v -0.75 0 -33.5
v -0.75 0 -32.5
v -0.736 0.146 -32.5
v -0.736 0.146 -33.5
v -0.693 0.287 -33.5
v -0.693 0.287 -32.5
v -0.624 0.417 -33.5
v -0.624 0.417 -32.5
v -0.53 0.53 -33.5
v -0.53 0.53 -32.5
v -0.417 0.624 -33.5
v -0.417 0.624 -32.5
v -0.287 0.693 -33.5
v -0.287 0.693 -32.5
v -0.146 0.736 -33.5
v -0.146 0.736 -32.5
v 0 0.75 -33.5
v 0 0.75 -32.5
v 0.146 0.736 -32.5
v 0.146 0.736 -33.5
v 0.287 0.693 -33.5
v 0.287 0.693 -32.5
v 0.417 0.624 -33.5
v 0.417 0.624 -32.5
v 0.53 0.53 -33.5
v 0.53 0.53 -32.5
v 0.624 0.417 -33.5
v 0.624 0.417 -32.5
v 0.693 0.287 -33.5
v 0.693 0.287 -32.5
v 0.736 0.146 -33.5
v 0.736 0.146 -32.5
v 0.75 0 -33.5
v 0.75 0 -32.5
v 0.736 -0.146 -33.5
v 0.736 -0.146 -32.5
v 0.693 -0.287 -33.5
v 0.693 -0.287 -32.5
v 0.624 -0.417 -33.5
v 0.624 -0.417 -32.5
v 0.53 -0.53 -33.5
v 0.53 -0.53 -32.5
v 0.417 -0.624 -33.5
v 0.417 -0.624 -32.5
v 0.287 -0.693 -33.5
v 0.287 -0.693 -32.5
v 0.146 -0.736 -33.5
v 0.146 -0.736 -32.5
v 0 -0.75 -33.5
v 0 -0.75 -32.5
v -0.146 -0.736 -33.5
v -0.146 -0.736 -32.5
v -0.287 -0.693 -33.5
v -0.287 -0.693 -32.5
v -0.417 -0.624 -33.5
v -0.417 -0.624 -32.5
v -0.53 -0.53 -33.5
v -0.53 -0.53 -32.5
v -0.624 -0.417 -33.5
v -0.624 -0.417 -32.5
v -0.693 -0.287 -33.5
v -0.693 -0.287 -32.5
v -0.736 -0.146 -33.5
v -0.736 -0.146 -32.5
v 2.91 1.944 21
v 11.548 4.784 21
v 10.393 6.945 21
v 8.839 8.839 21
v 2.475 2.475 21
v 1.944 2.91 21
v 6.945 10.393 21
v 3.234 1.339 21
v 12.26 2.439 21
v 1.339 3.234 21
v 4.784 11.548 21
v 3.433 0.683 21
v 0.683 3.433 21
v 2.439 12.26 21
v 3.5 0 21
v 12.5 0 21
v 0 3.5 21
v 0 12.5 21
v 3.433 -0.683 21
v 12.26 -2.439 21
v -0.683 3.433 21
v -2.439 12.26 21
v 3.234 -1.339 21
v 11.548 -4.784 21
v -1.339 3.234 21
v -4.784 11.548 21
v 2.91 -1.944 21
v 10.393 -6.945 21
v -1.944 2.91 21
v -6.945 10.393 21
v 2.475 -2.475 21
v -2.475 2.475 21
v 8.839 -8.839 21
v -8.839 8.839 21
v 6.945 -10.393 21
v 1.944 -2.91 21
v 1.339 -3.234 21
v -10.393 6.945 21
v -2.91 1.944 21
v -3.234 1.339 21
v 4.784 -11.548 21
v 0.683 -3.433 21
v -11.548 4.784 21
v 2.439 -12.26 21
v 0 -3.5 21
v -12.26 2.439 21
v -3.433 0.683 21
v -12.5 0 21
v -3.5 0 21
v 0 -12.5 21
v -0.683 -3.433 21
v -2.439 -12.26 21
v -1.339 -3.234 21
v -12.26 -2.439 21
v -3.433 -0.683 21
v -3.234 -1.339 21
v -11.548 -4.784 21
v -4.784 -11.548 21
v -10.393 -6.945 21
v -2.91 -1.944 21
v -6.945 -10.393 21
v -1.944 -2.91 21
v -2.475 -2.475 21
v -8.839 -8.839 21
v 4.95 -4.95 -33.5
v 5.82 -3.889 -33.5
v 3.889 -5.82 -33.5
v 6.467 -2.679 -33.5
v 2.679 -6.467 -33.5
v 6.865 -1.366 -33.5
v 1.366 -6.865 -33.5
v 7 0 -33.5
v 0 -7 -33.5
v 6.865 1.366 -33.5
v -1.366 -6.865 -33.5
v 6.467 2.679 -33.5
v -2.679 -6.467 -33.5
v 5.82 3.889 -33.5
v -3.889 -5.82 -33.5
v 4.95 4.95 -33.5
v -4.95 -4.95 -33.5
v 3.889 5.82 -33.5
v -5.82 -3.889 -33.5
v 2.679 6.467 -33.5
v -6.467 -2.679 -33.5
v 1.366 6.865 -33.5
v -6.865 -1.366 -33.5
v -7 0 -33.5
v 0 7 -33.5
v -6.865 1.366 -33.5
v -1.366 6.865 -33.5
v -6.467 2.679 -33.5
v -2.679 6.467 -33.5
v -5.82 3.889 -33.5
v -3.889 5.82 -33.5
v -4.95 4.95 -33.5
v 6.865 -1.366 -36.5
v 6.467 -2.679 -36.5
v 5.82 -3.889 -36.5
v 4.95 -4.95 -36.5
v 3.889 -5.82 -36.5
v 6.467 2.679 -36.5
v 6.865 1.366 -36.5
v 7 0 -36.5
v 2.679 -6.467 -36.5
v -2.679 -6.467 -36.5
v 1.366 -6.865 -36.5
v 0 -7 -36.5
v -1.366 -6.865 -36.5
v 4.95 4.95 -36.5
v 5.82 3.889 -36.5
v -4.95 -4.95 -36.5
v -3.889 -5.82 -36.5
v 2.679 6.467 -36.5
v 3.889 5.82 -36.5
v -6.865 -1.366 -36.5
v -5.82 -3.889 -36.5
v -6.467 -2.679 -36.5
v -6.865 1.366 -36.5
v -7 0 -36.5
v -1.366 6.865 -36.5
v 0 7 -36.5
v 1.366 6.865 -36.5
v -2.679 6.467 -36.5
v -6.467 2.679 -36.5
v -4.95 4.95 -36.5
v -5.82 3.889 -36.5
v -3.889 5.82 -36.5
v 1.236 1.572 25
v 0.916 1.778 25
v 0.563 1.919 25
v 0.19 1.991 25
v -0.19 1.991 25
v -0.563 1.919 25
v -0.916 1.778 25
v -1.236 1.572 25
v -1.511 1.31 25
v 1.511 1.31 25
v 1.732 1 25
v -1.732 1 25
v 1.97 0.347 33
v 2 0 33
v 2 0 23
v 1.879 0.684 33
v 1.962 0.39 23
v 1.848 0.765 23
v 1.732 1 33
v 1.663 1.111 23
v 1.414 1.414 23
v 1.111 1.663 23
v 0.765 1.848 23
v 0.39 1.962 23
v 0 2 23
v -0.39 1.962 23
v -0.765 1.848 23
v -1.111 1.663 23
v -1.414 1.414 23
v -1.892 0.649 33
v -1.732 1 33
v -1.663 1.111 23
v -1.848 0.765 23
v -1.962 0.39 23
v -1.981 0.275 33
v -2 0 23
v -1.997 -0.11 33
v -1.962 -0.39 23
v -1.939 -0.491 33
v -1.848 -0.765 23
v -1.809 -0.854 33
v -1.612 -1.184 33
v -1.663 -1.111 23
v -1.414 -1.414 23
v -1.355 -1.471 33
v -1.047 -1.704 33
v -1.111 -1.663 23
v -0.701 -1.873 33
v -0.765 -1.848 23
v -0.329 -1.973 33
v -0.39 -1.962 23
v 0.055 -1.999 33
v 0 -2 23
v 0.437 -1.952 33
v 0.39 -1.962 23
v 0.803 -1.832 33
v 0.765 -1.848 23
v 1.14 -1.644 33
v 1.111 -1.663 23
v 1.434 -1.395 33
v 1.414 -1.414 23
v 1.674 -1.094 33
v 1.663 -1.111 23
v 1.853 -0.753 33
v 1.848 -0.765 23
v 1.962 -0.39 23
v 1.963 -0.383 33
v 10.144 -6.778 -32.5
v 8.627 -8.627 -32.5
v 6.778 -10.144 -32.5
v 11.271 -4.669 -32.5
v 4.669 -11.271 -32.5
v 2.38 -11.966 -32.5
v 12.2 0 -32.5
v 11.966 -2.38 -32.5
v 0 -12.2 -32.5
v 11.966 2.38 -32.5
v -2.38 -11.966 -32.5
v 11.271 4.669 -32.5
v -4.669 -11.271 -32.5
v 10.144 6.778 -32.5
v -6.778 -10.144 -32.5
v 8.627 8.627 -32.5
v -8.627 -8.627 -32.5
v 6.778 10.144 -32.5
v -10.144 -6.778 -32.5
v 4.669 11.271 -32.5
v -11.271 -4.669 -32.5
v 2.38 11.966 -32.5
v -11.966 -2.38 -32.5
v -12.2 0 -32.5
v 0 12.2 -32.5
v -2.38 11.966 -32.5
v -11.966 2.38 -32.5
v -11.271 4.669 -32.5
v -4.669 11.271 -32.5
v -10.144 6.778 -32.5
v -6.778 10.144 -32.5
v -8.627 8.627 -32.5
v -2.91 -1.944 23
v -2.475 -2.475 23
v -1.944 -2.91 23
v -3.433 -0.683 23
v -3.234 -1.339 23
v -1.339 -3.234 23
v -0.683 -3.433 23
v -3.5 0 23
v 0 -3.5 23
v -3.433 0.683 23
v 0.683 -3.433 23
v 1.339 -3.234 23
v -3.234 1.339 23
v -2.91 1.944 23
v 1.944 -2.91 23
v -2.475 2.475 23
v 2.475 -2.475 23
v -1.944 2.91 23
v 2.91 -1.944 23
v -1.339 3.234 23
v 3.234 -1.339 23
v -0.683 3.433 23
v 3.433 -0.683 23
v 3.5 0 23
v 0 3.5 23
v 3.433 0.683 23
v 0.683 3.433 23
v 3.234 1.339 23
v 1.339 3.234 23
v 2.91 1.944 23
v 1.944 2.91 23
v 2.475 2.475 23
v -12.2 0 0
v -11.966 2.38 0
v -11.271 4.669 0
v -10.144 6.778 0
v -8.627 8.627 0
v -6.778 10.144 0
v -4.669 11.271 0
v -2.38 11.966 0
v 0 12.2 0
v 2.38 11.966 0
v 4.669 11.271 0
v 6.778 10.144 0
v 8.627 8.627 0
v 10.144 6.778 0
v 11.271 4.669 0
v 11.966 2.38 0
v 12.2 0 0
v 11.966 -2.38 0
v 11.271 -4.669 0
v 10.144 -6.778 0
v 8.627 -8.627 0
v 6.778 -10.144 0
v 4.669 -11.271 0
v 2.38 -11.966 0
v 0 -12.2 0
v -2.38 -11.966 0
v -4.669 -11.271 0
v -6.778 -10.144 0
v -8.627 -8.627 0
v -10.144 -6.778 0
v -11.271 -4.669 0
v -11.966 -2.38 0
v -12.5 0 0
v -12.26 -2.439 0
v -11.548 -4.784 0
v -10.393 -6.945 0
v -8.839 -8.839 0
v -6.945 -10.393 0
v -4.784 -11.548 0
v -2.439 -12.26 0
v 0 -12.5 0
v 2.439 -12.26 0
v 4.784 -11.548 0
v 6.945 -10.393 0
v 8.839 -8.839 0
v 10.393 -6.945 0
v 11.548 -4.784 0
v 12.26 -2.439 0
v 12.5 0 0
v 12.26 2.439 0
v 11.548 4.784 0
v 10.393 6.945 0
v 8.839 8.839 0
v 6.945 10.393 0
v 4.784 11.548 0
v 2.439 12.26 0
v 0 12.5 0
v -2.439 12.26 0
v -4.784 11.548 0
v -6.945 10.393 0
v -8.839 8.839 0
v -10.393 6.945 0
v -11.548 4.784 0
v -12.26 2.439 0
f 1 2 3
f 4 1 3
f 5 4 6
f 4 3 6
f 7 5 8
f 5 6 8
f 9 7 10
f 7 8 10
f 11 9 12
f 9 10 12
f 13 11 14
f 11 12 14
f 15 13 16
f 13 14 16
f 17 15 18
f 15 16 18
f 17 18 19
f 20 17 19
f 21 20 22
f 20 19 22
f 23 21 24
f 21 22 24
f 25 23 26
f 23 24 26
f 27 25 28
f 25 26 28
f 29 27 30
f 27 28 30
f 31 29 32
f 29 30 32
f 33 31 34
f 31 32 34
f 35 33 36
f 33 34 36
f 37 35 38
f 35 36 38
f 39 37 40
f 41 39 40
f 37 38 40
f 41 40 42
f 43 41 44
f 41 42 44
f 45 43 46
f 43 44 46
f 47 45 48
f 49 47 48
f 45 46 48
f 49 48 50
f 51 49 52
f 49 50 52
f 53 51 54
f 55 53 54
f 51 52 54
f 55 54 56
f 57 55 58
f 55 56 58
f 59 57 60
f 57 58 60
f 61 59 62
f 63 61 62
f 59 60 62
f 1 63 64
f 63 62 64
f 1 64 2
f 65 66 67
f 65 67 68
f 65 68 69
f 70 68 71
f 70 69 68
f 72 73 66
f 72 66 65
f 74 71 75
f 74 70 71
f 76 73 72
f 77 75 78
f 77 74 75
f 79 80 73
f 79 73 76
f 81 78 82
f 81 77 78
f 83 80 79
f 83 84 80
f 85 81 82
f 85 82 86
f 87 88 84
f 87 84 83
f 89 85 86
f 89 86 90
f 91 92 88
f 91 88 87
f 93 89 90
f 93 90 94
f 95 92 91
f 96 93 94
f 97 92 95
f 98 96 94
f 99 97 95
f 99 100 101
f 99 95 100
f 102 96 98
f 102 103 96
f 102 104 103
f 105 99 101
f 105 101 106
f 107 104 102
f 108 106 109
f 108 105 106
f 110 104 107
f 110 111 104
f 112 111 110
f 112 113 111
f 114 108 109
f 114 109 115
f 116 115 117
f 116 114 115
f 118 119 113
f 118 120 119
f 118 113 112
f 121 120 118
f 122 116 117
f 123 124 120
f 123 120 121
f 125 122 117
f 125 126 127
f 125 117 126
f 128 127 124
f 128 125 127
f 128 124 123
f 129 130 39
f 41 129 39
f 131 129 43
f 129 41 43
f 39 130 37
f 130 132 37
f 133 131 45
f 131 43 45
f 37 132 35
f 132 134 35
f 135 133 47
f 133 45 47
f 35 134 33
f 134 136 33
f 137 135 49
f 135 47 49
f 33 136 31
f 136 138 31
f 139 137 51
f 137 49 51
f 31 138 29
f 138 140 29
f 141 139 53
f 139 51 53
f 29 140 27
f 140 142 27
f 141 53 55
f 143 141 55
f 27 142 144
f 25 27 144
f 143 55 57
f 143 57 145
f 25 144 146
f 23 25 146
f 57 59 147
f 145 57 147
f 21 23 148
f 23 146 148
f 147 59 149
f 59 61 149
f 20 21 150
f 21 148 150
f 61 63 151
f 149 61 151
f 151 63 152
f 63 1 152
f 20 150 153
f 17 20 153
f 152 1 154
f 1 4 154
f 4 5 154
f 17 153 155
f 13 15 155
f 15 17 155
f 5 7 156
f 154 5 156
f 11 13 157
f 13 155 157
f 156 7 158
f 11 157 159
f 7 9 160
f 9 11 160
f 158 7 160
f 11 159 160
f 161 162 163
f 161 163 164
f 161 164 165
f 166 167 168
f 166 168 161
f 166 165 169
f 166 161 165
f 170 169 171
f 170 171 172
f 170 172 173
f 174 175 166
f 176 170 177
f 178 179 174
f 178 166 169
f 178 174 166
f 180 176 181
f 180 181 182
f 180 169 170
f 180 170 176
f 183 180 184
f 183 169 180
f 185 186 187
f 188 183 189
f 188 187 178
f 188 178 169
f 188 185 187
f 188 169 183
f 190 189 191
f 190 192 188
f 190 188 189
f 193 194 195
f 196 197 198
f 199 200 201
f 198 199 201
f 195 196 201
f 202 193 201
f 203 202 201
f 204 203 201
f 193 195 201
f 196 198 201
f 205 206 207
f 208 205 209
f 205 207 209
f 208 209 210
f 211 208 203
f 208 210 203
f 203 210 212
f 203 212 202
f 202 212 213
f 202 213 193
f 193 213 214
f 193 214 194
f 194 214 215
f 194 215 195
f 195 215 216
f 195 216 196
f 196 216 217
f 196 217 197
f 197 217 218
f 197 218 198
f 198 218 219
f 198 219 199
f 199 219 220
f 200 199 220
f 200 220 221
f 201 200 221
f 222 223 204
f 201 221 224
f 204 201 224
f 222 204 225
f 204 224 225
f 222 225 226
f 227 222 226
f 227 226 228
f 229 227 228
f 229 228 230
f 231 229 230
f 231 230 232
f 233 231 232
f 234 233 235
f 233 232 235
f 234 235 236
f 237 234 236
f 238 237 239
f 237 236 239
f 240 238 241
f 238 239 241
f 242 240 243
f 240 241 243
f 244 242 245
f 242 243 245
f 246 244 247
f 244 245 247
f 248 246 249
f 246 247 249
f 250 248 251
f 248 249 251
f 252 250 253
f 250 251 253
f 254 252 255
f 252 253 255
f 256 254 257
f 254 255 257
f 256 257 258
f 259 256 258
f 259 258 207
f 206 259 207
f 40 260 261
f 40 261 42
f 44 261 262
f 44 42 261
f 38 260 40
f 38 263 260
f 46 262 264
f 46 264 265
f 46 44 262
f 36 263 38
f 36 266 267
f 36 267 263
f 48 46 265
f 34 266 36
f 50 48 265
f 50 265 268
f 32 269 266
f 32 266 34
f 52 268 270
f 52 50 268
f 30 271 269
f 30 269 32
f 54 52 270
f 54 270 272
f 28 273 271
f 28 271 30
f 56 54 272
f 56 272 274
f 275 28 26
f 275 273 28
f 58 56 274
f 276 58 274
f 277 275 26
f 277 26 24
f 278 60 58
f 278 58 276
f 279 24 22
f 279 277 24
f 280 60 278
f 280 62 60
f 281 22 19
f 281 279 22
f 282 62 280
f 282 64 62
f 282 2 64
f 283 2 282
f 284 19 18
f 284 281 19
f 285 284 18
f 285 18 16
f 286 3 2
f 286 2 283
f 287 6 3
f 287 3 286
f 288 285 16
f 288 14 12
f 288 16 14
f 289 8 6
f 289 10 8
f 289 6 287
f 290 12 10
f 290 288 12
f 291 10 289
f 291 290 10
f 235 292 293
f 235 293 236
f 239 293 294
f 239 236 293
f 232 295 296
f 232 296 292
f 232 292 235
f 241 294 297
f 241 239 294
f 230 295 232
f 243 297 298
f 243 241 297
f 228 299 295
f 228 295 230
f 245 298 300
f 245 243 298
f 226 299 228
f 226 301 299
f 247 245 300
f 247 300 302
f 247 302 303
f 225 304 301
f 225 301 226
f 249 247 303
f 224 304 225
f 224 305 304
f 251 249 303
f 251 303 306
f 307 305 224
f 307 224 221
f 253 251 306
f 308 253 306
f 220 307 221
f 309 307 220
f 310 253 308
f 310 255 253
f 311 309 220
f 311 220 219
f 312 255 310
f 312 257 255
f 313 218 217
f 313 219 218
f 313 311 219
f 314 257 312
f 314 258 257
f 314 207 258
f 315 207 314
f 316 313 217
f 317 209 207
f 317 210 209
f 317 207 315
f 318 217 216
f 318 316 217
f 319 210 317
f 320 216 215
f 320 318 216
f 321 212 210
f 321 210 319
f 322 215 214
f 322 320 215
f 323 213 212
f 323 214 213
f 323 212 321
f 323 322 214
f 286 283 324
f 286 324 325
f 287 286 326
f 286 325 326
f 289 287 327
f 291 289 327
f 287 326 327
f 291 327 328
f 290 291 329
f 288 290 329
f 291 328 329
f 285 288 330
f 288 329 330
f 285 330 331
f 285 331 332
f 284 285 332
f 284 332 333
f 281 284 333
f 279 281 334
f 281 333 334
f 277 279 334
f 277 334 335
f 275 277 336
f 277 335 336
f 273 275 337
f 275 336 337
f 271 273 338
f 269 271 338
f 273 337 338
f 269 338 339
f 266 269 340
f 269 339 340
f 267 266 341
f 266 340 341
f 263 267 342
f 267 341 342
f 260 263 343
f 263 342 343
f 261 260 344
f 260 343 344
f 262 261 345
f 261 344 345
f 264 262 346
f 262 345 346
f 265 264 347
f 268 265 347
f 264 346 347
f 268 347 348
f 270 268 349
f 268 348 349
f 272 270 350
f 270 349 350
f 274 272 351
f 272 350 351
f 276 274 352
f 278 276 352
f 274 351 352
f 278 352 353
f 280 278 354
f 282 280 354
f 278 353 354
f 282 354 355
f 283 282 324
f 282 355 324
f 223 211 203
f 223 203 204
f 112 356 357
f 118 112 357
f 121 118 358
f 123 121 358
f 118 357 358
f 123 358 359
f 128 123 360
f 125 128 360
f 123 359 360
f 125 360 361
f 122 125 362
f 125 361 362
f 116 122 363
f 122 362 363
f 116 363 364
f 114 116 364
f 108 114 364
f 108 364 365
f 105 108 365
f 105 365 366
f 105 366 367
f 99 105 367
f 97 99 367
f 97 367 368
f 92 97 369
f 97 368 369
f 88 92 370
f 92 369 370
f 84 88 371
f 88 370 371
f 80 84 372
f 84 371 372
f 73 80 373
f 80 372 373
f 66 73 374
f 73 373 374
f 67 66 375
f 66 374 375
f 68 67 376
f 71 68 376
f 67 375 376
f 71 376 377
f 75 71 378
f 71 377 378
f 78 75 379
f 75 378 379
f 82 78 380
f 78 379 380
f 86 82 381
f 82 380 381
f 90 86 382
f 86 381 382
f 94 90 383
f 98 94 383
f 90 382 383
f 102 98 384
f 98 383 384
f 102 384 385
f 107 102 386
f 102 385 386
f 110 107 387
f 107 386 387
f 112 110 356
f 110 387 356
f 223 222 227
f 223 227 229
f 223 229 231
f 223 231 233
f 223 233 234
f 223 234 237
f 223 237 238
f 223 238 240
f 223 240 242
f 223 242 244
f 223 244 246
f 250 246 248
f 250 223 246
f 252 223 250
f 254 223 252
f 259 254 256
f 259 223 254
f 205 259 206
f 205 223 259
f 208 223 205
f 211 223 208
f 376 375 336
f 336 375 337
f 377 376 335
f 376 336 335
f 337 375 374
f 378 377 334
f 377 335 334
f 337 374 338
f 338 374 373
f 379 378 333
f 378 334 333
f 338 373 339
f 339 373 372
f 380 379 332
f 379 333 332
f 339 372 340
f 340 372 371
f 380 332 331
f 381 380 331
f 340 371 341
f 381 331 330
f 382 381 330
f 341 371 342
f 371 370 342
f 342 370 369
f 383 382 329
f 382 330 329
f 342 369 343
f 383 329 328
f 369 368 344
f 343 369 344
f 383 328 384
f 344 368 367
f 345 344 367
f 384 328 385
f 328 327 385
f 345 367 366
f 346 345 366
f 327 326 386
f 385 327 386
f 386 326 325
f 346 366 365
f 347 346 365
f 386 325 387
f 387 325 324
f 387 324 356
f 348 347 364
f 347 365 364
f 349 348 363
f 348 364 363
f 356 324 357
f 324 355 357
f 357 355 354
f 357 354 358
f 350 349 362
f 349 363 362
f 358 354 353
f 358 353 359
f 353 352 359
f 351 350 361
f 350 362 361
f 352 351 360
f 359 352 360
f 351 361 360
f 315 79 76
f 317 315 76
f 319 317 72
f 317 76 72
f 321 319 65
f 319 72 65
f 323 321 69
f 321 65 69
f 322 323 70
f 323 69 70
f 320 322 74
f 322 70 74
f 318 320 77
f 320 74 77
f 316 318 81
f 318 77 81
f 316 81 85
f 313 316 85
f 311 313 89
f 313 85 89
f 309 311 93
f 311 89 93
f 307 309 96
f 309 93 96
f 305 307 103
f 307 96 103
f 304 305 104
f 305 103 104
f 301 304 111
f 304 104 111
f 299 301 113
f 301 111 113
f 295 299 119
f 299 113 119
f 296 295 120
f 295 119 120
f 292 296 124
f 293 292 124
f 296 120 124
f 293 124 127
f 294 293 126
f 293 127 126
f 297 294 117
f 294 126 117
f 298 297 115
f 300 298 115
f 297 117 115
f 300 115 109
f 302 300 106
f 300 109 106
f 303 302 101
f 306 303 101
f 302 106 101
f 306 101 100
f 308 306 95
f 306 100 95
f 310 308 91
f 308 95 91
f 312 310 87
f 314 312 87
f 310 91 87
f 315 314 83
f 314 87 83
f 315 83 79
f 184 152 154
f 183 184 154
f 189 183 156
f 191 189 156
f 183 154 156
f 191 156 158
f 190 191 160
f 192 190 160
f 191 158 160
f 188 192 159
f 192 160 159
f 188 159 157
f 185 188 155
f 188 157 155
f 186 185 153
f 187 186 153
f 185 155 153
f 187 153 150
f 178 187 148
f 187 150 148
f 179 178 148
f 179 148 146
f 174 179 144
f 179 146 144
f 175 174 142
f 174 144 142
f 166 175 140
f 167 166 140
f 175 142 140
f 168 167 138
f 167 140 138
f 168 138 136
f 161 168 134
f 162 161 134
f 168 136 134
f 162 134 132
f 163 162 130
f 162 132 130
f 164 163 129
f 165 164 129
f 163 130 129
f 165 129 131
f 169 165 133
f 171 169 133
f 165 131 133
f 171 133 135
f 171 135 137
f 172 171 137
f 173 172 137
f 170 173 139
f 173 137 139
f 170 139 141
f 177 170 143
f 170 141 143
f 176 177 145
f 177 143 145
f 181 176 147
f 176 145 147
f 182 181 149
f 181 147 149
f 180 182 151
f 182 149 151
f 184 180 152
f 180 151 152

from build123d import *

# Parameters (mm, degrees)
ESBO_O1_R                 = 12.5
RESSALTO_EXTRUS_O2_DEPTH  = 21
ESBO_O2_R                 = 12.2
RESSALTO_EXTRUS_O3_DEPTH  = 31
ESBO_O3_R                 = 3.5
RESSALTO_EXTRUS_O4_DEPTH  = 2
ESBO_O4_R                 = 2
RESSALTO_EXTRUS_O6_DEPTH  = 10
CORTE_EXTRUS_O1_DEPTH     = 8
ESBO_O7_R                 = 12.2
RESSALTO_EXTRUS_O8_DEPTH  = 1.5
ESBO_O8_R                 = 0.75
RESSALTO_EXTRUS_O9_DEPTH  = 1
ESBO_O9_R                 = 7
RESSALTO_EXTRUS_O10_DEPTH = 3


with BuildPart() as part:
    # Esboço1 → Ressalto-extrusão2 (new body)
    with BuildSketch(Plane.XY):
        with Locations(Location((0, 0, 0), (0, 0, 180))):
            Circle(ESBO_O1_R)
    extrude(amount=RESSALTO_EXTRUS_O2_DEPTH)

    # Esboço2 → Ressalto-extrusão3 (add)
    with BuildSketch(Plane(origin=(0, 0, 0), x_dir=(-1, 0, 0), z_dir=(0, 0, -1))):
        Circle(ESBO_O2_R)
    extrude(amount=RESSALTO_EXTRUS_O3_DEPTH)

    # Esboço3 → Ressalto-extrusão4 (add)
    with BuildSketch(Plane.XY.offset(21)):
        Circle(ESBO_O3_R)
    extrude(amount=RESSALTO_EXTRUS_O4_DEPTH)

    # Esboço4 → Ressalto-extrusão6 (add)
    with BuildSketch(Plane.XY.offset(23)):
        Circle(ESBO_O4_R)
    extrude(amount=RESSALTO_EXTRUS_O6_DEPTH)

    # Esboço6 → Corte-extrusão1 (cut)
    with BuildSketch(Plane.XY.offset(33)):
        Polygon((0, 2), (3.689966046, 2), (3.689966046, 1), (-3.825112122, 1), (-3.825112122, 2), align=None)
    extrude(amount=-CORTE_EXTRUS_O1_DEPTH, mode=Mode.SUBTRACT)

    # Esboço7 → Ressalto-extrusão8 (add)
    with BuildSketch(Plane(origin=(0, 0, -31), x_dir=(-1, 0, 0), z_dir=(0, 0, -1))):
        Circle(ESBO_O7_R)
    extrude(amount=RESSALTO_EXTRUS_O8_DEPTH)

    # Esboço8 → Ressalto-extrusão9 (add)
    with BuildSketch(Plane(origin=(0, 0, -32.5), x_dir=(-1, 0, 0), z_dir=(0, 0, -1))):
        Circle(ESBO_O8_R)
    extrude(amount=RESSALTO_EXTRUS_O9_DEPTH)

    # Esboço9 → Ressalto-extrusão10 (add)
    with BuildSketch(Plane(origin=(0, 0, -33.5), x_dir=(-1, 0, 0), z_dir=(0, 0, -1))):
        Circle(ESBO_O9_R)
    extrude(amount=RESSALTO_EXTRUS_O10_DEPTH)


solid = part.part
